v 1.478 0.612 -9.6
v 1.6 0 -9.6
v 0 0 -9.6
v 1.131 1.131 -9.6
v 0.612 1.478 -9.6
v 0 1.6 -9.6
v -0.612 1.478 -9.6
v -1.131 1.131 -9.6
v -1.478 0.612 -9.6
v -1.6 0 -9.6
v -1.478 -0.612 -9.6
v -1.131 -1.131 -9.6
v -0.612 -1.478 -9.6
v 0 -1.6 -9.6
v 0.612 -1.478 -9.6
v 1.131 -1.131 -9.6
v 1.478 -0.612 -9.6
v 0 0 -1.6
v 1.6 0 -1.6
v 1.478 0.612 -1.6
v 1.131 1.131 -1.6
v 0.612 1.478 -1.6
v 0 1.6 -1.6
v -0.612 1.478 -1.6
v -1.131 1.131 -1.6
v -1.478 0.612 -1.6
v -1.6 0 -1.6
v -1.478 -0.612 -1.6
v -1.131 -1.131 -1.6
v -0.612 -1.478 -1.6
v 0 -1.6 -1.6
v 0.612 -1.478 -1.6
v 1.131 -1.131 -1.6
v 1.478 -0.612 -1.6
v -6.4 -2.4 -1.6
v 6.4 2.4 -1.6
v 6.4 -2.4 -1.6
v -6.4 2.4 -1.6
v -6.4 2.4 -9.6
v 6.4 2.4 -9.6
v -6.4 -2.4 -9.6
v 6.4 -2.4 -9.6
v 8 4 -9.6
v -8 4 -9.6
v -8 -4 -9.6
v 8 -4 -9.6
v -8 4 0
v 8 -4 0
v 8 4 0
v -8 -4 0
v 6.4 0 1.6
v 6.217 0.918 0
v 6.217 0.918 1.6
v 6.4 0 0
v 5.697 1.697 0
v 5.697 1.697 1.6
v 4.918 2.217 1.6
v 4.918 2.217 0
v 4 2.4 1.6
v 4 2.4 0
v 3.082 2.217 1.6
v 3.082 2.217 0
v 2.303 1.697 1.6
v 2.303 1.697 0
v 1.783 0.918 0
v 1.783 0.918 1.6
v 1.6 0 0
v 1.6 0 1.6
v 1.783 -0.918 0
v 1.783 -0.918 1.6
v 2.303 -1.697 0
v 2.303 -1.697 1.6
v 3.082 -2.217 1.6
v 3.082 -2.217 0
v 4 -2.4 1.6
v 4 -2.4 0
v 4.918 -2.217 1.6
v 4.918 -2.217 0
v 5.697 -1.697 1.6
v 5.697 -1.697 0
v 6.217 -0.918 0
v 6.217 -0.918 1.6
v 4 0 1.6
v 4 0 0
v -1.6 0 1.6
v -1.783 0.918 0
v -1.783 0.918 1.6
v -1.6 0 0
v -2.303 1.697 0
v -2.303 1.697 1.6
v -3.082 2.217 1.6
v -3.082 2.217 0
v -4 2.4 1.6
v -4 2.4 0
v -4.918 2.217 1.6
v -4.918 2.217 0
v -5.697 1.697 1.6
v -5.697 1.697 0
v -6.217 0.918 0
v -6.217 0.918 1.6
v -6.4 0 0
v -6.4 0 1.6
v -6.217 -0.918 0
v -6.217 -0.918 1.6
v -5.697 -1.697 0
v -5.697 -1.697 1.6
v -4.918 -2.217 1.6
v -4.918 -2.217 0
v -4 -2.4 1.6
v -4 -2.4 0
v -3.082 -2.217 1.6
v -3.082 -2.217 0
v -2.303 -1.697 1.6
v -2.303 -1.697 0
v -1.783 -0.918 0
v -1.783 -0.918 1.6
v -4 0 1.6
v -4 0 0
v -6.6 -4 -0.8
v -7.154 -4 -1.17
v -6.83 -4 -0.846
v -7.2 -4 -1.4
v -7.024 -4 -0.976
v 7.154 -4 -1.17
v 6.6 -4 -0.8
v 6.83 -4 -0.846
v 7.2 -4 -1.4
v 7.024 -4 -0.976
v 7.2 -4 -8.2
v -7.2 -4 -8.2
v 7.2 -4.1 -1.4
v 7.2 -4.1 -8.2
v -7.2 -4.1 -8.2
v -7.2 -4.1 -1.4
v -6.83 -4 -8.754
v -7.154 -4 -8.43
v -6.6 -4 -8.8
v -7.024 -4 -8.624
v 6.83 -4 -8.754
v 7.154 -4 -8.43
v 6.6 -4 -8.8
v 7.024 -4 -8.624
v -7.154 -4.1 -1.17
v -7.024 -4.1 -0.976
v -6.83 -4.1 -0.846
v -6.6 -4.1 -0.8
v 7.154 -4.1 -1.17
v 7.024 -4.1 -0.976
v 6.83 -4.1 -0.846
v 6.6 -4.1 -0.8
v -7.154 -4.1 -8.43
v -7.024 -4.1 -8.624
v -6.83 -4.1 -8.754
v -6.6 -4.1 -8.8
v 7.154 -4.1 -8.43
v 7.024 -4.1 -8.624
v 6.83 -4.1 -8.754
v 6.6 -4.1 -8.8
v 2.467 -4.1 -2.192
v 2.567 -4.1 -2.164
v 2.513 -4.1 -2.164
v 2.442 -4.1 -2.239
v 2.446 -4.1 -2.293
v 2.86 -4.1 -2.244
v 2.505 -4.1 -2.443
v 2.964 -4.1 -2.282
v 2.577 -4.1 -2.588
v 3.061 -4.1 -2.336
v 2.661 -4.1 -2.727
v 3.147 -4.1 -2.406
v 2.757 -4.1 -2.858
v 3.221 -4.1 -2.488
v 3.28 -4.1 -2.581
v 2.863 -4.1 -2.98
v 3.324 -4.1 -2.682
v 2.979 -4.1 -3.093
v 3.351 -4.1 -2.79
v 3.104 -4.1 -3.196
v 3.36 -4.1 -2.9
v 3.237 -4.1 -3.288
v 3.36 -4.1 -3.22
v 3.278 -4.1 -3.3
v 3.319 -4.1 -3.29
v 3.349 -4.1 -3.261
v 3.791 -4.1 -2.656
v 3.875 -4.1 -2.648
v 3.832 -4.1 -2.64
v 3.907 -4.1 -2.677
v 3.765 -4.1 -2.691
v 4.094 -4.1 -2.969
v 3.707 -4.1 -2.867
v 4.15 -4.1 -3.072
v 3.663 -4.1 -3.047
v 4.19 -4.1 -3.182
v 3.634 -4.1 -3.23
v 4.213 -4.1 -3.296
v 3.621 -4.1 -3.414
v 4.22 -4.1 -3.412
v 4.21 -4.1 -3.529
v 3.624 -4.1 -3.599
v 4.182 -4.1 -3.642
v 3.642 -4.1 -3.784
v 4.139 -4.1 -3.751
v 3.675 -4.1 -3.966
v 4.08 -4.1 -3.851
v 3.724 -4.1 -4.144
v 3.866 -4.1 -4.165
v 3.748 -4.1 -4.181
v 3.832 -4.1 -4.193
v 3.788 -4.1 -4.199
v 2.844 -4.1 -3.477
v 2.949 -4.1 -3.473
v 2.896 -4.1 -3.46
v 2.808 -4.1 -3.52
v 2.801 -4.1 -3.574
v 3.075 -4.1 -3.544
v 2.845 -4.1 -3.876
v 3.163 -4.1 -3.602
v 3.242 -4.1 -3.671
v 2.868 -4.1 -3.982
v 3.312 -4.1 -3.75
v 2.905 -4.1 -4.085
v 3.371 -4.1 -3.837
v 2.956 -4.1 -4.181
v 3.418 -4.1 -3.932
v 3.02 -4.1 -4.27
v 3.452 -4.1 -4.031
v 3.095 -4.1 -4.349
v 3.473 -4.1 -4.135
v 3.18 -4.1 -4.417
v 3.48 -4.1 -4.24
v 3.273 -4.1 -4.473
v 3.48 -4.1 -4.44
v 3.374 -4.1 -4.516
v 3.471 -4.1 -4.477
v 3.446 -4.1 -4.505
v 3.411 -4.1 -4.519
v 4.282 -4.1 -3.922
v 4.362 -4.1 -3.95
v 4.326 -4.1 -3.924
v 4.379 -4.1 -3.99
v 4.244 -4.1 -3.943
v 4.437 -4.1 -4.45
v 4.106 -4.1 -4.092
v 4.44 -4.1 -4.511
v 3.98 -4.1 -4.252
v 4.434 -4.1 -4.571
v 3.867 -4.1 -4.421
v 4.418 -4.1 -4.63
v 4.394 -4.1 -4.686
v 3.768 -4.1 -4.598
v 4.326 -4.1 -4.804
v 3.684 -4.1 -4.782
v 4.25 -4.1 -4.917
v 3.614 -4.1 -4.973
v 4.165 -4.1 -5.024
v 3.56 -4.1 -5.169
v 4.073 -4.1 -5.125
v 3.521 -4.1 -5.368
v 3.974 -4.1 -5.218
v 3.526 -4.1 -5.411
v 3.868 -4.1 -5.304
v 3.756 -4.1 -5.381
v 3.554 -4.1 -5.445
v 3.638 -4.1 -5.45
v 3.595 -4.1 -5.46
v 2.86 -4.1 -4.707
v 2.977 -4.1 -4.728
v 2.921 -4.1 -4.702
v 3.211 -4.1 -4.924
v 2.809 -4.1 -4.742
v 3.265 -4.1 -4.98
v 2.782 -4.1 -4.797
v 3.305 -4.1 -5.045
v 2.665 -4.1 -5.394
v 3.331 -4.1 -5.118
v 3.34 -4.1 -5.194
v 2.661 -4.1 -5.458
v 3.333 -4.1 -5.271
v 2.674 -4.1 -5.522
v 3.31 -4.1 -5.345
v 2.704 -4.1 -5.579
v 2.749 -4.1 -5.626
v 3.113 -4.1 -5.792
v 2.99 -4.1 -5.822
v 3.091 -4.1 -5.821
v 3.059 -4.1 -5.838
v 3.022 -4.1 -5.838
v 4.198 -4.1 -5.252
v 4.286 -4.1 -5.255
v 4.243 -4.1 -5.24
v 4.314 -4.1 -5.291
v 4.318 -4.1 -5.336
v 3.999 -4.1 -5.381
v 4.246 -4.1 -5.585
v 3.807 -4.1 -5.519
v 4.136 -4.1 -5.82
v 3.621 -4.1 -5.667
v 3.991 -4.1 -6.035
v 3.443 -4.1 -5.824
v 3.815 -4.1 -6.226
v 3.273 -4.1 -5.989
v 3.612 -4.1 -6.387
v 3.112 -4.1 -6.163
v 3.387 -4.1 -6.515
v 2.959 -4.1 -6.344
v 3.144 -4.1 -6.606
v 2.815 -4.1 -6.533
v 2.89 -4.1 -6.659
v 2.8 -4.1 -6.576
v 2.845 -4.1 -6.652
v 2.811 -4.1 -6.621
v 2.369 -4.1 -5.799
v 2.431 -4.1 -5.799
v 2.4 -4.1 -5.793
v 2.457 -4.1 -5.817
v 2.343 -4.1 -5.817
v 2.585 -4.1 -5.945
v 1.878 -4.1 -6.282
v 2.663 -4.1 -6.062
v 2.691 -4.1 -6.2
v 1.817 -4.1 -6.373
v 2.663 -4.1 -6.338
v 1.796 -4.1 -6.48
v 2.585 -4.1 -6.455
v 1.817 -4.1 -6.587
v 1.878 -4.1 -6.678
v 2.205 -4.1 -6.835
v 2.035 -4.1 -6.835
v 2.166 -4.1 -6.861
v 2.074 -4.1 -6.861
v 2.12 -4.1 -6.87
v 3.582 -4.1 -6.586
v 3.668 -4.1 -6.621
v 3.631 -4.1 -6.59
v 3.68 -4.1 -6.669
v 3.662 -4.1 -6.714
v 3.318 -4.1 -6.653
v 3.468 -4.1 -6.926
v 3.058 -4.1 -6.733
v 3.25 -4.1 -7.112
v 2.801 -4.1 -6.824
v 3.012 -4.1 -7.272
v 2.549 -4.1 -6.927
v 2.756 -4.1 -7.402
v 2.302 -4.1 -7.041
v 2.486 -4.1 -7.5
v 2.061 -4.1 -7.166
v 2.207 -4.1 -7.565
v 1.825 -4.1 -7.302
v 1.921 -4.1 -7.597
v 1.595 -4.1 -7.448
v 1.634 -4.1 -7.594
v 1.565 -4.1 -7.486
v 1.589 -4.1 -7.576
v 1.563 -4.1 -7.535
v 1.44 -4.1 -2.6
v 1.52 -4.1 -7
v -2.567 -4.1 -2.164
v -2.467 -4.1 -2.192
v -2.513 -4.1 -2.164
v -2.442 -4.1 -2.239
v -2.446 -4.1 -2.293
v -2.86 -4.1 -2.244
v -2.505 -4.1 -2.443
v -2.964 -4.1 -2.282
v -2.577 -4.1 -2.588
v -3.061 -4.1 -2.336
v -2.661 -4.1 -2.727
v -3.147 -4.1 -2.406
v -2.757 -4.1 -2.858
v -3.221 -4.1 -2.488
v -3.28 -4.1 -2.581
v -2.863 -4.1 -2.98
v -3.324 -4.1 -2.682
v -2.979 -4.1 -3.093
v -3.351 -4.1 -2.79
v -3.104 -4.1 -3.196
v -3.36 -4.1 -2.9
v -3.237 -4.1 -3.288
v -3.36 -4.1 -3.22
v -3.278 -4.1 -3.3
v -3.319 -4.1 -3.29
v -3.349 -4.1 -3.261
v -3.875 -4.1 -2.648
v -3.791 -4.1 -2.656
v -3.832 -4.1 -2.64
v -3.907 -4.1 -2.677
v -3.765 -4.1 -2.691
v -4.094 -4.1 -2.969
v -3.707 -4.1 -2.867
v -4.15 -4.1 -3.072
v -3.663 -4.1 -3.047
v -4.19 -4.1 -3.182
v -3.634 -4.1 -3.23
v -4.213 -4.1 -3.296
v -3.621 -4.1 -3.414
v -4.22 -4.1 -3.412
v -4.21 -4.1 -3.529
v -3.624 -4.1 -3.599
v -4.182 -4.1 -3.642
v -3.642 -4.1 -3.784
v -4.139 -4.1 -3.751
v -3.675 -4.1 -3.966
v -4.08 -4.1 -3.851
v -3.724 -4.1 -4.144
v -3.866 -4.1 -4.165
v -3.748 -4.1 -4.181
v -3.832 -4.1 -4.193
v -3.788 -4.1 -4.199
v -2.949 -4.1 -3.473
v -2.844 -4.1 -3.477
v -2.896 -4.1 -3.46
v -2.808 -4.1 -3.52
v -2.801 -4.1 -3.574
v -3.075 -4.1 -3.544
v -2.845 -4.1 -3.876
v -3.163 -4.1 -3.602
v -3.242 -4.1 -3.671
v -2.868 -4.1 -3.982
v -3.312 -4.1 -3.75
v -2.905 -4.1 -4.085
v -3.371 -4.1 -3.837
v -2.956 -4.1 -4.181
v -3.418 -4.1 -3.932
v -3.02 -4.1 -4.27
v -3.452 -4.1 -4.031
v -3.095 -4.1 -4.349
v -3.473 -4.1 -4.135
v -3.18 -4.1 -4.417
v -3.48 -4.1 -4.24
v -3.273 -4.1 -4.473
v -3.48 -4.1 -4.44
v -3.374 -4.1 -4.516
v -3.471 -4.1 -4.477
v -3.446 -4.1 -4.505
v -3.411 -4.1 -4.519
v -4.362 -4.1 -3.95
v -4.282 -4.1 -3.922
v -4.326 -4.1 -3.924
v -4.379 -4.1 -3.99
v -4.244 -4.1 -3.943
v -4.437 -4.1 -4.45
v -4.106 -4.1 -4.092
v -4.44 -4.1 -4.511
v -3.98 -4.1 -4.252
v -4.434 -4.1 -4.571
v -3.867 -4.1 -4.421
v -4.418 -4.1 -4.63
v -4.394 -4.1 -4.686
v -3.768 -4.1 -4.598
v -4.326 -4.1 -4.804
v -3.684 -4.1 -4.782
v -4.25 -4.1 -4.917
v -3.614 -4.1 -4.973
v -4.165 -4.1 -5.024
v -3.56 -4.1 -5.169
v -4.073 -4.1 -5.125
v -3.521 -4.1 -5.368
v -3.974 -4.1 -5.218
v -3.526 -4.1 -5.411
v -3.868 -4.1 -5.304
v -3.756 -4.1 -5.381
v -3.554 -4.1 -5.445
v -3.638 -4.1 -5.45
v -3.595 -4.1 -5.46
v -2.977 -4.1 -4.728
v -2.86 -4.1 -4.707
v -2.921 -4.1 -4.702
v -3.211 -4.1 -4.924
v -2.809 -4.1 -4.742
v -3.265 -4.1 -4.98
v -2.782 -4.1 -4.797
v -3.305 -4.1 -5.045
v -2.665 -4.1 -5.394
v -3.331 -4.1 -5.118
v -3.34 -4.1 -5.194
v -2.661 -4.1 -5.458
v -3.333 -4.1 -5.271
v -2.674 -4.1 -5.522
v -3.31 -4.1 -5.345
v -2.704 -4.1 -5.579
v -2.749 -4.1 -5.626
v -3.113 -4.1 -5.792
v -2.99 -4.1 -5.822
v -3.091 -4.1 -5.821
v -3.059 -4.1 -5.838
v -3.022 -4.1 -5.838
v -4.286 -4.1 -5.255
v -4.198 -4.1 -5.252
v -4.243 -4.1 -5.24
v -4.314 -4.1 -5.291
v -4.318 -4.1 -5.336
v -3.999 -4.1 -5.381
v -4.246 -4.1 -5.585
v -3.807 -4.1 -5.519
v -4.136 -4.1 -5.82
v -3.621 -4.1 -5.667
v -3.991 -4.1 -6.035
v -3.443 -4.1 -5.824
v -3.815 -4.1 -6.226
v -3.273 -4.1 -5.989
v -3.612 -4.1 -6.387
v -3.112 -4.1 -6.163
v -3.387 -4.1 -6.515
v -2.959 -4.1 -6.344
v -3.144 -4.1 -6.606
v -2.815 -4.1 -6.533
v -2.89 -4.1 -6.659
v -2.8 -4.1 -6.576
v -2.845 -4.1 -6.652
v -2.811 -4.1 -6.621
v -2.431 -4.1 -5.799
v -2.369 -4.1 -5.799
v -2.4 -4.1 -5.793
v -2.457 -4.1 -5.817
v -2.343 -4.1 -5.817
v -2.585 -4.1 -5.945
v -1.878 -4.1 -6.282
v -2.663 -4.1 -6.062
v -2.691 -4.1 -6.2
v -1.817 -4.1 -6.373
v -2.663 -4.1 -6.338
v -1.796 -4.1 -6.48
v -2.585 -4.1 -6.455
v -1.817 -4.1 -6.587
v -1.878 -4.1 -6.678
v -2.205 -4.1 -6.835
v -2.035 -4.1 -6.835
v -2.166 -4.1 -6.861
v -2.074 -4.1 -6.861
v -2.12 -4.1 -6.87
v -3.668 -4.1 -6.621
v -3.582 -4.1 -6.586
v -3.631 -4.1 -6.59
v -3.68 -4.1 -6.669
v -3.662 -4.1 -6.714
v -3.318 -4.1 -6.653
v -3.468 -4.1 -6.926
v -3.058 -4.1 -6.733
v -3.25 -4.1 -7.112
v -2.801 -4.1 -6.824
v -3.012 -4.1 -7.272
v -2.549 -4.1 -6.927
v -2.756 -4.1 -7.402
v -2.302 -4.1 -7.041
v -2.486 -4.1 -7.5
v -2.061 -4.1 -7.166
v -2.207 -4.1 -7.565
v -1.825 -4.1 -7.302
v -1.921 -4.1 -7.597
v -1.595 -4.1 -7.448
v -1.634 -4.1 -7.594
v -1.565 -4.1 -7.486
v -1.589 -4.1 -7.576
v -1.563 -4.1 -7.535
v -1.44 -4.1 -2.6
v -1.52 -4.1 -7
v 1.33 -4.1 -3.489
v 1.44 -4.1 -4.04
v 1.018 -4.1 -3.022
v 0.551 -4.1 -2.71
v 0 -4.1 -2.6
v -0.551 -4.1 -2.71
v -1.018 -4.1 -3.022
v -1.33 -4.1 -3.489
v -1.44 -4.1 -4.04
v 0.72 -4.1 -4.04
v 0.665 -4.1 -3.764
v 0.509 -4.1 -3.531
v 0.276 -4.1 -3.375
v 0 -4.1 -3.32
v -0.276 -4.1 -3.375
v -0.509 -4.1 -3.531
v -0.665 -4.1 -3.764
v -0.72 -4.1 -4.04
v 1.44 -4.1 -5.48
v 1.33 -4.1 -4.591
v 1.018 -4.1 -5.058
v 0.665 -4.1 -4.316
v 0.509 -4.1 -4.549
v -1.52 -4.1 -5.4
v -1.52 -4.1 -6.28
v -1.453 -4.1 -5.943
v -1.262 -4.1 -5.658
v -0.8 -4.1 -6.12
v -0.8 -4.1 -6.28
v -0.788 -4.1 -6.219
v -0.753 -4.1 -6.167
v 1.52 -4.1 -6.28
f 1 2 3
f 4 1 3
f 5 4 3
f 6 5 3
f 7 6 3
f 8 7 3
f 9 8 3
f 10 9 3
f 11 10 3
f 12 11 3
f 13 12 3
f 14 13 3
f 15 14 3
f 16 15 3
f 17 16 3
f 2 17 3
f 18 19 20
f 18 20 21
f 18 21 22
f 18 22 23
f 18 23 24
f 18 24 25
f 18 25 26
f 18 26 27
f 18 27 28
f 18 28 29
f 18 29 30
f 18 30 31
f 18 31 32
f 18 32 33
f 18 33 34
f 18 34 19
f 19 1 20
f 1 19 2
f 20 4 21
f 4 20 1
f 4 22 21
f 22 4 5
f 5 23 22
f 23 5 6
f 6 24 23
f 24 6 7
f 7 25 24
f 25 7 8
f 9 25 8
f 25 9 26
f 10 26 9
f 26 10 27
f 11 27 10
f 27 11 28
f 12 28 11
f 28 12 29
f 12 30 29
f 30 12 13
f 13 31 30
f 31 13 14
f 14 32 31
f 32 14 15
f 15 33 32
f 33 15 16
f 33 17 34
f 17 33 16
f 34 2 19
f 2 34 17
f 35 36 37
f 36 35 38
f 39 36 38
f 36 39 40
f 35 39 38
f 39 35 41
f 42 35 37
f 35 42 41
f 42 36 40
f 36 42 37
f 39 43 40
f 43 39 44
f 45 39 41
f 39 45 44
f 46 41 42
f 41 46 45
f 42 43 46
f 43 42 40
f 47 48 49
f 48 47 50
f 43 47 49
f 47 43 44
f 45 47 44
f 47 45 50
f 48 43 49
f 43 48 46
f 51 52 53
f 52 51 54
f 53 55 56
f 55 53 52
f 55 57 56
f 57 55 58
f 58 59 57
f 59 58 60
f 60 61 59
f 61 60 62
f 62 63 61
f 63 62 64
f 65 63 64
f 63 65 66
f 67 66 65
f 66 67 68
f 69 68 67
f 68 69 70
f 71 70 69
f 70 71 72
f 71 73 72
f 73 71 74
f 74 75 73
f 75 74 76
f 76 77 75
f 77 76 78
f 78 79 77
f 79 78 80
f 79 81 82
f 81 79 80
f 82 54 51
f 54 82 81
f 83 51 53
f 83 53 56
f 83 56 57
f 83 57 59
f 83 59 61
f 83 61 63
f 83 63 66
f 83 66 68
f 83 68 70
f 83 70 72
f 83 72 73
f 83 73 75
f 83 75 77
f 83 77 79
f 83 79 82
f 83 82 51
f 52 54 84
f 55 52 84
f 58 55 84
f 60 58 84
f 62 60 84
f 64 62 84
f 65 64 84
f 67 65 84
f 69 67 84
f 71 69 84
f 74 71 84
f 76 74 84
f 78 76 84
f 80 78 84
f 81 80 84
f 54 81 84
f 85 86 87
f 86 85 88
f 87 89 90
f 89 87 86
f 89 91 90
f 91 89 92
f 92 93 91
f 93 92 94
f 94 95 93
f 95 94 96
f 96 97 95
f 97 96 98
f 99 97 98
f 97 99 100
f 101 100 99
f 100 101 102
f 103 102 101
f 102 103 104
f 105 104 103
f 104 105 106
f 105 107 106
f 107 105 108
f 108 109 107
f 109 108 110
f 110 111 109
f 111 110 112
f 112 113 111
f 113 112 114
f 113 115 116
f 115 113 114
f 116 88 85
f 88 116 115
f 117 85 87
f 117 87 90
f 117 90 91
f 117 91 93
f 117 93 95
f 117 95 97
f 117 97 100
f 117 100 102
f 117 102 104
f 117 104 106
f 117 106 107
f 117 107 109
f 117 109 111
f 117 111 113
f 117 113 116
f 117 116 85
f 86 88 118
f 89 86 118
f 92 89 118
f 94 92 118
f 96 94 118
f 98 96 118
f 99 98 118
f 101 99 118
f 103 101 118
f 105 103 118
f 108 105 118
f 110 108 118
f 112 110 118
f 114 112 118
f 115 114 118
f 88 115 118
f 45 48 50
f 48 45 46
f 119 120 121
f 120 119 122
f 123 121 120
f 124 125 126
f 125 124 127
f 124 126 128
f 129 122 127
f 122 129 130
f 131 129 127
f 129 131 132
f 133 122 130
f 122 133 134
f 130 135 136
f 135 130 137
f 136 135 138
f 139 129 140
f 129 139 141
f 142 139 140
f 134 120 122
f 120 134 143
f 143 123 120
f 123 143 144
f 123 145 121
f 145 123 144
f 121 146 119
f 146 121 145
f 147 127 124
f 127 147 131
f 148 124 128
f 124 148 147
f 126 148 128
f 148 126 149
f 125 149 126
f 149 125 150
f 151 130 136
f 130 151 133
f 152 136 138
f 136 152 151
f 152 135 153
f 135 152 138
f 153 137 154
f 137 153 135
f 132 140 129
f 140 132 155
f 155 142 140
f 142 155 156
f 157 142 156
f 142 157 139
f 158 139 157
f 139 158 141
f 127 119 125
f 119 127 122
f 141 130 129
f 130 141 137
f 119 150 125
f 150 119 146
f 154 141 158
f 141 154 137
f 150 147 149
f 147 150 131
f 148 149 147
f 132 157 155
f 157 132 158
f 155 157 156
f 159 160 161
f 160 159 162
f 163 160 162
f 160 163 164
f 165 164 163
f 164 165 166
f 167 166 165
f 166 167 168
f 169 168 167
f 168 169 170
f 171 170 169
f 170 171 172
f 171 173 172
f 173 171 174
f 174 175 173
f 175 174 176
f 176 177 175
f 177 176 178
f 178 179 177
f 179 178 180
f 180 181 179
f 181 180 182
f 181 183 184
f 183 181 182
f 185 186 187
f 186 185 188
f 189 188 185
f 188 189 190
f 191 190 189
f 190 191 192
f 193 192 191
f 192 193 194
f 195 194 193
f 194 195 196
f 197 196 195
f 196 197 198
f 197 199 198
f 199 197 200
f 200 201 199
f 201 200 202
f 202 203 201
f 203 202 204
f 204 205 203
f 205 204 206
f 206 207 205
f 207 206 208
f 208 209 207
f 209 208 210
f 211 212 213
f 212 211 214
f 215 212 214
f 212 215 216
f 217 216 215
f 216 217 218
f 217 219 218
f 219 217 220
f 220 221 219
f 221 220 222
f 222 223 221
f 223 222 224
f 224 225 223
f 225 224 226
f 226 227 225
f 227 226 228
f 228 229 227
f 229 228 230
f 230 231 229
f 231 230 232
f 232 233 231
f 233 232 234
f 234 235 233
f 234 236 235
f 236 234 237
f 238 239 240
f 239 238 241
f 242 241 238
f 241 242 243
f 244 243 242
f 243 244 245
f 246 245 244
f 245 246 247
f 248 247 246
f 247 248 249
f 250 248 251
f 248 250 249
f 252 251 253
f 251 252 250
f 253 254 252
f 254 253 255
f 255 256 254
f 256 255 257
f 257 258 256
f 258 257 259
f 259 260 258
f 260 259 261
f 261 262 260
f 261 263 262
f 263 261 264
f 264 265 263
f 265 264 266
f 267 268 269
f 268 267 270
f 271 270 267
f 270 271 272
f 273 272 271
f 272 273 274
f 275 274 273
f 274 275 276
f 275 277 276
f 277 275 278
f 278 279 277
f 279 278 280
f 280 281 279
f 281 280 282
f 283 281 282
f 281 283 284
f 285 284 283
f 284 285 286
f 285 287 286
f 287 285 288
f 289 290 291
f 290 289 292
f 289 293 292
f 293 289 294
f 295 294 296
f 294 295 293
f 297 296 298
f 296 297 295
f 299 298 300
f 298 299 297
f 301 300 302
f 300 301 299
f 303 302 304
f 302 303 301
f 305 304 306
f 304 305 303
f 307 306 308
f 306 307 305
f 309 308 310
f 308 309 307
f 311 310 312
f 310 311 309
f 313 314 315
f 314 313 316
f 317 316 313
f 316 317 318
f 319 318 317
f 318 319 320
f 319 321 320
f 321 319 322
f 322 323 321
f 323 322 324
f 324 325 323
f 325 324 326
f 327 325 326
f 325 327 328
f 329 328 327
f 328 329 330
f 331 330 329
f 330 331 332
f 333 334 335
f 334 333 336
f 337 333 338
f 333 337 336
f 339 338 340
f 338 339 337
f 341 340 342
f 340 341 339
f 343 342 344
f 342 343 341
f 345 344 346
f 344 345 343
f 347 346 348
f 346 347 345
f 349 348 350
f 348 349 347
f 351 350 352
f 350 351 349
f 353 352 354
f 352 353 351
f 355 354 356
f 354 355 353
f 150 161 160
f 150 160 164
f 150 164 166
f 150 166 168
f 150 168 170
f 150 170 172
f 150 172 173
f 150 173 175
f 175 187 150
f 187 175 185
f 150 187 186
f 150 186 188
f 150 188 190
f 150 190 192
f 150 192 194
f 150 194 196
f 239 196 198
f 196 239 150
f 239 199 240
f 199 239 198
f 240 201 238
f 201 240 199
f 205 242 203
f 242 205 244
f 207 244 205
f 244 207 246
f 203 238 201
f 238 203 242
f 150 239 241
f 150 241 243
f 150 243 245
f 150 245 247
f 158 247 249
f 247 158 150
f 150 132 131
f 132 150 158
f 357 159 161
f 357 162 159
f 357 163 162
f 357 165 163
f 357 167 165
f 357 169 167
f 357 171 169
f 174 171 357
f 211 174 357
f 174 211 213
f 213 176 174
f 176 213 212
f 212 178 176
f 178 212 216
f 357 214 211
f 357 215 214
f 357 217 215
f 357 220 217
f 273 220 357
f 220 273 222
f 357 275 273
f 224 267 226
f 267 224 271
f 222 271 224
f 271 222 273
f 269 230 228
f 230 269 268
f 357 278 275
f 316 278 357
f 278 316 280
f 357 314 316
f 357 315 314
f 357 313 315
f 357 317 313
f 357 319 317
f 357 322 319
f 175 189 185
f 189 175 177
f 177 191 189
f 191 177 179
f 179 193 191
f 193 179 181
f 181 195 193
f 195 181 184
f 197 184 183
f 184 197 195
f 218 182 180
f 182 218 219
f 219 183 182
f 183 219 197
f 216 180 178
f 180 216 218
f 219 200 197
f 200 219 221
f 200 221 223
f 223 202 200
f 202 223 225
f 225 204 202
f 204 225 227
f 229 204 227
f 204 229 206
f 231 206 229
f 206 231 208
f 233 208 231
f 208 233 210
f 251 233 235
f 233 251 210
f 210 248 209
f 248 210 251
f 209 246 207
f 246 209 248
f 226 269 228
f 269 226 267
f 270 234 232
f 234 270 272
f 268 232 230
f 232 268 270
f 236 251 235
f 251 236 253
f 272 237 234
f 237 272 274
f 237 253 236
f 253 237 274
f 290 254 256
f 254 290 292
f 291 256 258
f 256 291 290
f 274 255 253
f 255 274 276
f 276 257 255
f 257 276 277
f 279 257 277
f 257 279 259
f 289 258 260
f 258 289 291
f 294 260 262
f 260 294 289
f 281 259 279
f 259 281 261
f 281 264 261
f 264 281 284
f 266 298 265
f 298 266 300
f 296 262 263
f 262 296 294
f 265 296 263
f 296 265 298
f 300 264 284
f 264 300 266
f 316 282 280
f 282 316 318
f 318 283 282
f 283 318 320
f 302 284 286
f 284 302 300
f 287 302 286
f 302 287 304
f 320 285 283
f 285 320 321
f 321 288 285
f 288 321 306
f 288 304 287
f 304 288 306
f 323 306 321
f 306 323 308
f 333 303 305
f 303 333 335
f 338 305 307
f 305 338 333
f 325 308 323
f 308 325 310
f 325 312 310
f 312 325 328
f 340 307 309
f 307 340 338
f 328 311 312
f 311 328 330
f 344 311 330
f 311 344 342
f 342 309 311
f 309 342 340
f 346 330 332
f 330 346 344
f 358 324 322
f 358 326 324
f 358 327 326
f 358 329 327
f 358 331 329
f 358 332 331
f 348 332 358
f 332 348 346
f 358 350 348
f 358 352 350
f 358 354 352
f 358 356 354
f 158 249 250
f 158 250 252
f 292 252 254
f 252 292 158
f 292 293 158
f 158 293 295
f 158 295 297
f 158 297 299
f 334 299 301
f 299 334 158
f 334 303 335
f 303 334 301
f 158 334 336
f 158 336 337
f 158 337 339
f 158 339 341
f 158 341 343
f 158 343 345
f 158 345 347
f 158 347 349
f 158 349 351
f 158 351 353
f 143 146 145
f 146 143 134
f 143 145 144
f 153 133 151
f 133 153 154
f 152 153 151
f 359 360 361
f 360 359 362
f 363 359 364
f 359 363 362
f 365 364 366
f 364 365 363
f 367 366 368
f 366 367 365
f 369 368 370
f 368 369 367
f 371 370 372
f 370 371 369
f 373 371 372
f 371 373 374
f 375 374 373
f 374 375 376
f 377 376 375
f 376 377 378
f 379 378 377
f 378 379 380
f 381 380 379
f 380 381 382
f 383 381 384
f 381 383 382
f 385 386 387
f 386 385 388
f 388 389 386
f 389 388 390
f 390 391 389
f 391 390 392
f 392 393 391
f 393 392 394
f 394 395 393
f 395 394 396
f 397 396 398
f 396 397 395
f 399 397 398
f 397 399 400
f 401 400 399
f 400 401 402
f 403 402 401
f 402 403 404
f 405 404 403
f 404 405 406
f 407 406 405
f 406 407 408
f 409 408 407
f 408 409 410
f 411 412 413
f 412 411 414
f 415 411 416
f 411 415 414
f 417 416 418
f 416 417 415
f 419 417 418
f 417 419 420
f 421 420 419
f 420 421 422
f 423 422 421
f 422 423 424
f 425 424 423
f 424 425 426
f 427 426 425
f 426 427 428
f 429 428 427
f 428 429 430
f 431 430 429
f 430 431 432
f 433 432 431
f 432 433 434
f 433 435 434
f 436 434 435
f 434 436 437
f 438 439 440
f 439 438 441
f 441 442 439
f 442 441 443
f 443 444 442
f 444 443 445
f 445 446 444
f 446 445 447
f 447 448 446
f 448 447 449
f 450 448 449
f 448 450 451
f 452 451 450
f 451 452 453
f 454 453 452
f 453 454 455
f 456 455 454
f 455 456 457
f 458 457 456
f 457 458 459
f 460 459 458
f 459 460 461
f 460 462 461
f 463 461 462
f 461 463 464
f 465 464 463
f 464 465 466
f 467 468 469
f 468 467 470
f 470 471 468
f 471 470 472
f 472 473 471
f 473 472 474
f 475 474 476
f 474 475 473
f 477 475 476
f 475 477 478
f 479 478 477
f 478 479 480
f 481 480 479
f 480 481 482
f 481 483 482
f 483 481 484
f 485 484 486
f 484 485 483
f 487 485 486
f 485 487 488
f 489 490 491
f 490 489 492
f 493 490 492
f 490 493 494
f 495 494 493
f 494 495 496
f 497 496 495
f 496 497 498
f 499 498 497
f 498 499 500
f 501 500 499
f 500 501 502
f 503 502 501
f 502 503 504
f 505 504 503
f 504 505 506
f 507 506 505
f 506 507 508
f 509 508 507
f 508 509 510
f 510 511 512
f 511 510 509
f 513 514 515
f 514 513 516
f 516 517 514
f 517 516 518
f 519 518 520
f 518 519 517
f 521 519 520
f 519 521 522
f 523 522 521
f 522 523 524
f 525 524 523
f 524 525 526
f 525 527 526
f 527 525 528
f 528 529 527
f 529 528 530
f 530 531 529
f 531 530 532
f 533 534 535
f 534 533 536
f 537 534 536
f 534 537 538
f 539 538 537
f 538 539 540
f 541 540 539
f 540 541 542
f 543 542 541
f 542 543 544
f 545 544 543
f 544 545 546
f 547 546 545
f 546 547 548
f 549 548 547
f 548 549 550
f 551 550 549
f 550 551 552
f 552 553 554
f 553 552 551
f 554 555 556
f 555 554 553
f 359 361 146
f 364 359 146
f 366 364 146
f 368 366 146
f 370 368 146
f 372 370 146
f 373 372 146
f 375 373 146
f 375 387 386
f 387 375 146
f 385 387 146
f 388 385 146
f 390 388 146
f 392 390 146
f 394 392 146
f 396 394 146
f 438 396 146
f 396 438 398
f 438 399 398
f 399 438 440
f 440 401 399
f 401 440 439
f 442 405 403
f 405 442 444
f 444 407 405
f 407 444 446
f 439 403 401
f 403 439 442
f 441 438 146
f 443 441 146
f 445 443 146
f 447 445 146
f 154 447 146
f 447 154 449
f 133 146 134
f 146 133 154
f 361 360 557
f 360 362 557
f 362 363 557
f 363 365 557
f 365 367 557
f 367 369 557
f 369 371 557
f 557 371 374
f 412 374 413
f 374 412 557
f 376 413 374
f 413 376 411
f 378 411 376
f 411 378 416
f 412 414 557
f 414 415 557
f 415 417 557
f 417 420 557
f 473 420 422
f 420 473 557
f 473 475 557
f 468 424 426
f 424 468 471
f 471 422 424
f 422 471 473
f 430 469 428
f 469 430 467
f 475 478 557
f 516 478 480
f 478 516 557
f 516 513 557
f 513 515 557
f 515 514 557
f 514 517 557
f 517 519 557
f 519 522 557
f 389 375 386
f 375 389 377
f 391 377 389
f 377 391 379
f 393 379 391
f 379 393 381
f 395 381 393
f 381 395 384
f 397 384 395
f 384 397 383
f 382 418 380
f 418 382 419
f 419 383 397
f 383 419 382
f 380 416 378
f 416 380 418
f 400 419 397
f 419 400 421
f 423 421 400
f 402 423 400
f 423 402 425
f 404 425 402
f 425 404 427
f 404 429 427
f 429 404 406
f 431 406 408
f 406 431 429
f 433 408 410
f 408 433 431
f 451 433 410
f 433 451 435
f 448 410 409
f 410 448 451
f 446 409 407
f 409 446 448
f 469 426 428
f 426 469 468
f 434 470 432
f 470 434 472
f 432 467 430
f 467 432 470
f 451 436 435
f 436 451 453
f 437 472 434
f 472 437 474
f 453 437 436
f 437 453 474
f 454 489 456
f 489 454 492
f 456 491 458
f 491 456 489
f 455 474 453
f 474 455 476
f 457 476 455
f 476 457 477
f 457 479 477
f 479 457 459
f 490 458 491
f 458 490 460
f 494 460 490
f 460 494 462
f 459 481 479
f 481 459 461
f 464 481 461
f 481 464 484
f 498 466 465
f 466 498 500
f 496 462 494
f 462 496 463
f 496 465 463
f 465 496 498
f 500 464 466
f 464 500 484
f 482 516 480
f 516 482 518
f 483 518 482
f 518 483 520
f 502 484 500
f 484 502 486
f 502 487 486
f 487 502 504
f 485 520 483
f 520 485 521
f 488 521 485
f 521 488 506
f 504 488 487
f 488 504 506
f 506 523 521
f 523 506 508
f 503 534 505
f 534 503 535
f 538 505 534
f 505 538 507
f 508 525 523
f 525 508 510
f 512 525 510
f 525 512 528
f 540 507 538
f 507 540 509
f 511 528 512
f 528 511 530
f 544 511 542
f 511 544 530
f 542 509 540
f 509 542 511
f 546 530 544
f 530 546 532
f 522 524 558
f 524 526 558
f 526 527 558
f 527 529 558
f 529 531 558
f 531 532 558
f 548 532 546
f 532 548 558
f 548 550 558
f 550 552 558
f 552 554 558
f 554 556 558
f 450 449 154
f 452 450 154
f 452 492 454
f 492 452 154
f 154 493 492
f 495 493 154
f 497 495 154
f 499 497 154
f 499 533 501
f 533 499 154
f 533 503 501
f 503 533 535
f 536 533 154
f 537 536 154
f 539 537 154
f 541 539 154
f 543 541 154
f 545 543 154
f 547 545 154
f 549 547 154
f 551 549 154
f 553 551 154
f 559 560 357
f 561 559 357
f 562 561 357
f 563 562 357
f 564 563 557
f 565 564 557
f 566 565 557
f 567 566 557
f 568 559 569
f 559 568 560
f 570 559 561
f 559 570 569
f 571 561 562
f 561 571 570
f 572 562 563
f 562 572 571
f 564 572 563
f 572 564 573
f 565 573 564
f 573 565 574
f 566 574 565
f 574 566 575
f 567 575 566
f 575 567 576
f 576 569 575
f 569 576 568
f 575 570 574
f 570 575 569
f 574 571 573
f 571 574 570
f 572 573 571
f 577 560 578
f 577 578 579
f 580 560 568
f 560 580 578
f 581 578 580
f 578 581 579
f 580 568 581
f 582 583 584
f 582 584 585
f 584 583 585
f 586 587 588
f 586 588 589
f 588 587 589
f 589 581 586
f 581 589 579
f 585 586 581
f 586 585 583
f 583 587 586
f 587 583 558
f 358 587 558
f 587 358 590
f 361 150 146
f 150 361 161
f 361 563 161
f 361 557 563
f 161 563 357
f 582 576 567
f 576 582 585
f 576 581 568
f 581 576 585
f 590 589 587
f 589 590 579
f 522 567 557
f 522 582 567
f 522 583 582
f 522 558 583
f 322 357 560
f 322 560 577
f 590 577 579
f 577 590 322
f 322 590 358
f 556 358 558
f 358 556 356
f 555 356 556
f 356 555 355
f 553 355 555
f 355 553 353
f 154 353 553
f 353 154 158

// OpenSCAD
use <../lib.scad>
use <3004.scad>
use <6177969af.scad>
function ldraw_lib__3004d1h() = [
// 0 Brick  1 x  2 with Red "2" and Black Laurel Wreath Sticker
// 0 Name: 3004d1h.dat
// 0 Author: Alfred Schmitz [AlfredS]
// 0 !LDRAW_ORG Shortcut UPDATE 2026-09
// 0 !LICENSE Licensed under CC BY 4.0 : see CAreadme.txt
// 
// 0 BFC CERTIFY CCW
  [0,"BFC","CERTIFY"],
  [0,"BFC","CCW"],
// 
// 0 !CATEGORY Sticker Shortcut
// 0 !KEYWORDS Ford, GT40, Set 75881, Speed Champions
// 
// 0 !HISTORY 2026-09-30 [OrionP] Official Update 2026-09
// 
// 1 16 0 0 0 1 0 0 0 1 0 0 0 1 3004.dat
  [1,16,0,0,0,1,0,0,0,1,0,0,0,1, ldraw_lib__3004()],
// 1 16 0 12 -10 1 0 0 0 0 -1 0 1 0 6177969af.dat
  [1,16,0,12,-10,1,0,0,0,0,-1,0,1,0, ldraw_lib__6177969af()],
];
module ldraw_lib__3004d1h(step=0, col=false, unit=2/5, alt=false, line=0.2, solid=!$preview)
    makepoly(ldraw_lib__3004d1h(), step=step, col=col, unit=unit, alt=alt, line=line, solid=solid);
ldraw_lib__3004d1h(line=0.2);
